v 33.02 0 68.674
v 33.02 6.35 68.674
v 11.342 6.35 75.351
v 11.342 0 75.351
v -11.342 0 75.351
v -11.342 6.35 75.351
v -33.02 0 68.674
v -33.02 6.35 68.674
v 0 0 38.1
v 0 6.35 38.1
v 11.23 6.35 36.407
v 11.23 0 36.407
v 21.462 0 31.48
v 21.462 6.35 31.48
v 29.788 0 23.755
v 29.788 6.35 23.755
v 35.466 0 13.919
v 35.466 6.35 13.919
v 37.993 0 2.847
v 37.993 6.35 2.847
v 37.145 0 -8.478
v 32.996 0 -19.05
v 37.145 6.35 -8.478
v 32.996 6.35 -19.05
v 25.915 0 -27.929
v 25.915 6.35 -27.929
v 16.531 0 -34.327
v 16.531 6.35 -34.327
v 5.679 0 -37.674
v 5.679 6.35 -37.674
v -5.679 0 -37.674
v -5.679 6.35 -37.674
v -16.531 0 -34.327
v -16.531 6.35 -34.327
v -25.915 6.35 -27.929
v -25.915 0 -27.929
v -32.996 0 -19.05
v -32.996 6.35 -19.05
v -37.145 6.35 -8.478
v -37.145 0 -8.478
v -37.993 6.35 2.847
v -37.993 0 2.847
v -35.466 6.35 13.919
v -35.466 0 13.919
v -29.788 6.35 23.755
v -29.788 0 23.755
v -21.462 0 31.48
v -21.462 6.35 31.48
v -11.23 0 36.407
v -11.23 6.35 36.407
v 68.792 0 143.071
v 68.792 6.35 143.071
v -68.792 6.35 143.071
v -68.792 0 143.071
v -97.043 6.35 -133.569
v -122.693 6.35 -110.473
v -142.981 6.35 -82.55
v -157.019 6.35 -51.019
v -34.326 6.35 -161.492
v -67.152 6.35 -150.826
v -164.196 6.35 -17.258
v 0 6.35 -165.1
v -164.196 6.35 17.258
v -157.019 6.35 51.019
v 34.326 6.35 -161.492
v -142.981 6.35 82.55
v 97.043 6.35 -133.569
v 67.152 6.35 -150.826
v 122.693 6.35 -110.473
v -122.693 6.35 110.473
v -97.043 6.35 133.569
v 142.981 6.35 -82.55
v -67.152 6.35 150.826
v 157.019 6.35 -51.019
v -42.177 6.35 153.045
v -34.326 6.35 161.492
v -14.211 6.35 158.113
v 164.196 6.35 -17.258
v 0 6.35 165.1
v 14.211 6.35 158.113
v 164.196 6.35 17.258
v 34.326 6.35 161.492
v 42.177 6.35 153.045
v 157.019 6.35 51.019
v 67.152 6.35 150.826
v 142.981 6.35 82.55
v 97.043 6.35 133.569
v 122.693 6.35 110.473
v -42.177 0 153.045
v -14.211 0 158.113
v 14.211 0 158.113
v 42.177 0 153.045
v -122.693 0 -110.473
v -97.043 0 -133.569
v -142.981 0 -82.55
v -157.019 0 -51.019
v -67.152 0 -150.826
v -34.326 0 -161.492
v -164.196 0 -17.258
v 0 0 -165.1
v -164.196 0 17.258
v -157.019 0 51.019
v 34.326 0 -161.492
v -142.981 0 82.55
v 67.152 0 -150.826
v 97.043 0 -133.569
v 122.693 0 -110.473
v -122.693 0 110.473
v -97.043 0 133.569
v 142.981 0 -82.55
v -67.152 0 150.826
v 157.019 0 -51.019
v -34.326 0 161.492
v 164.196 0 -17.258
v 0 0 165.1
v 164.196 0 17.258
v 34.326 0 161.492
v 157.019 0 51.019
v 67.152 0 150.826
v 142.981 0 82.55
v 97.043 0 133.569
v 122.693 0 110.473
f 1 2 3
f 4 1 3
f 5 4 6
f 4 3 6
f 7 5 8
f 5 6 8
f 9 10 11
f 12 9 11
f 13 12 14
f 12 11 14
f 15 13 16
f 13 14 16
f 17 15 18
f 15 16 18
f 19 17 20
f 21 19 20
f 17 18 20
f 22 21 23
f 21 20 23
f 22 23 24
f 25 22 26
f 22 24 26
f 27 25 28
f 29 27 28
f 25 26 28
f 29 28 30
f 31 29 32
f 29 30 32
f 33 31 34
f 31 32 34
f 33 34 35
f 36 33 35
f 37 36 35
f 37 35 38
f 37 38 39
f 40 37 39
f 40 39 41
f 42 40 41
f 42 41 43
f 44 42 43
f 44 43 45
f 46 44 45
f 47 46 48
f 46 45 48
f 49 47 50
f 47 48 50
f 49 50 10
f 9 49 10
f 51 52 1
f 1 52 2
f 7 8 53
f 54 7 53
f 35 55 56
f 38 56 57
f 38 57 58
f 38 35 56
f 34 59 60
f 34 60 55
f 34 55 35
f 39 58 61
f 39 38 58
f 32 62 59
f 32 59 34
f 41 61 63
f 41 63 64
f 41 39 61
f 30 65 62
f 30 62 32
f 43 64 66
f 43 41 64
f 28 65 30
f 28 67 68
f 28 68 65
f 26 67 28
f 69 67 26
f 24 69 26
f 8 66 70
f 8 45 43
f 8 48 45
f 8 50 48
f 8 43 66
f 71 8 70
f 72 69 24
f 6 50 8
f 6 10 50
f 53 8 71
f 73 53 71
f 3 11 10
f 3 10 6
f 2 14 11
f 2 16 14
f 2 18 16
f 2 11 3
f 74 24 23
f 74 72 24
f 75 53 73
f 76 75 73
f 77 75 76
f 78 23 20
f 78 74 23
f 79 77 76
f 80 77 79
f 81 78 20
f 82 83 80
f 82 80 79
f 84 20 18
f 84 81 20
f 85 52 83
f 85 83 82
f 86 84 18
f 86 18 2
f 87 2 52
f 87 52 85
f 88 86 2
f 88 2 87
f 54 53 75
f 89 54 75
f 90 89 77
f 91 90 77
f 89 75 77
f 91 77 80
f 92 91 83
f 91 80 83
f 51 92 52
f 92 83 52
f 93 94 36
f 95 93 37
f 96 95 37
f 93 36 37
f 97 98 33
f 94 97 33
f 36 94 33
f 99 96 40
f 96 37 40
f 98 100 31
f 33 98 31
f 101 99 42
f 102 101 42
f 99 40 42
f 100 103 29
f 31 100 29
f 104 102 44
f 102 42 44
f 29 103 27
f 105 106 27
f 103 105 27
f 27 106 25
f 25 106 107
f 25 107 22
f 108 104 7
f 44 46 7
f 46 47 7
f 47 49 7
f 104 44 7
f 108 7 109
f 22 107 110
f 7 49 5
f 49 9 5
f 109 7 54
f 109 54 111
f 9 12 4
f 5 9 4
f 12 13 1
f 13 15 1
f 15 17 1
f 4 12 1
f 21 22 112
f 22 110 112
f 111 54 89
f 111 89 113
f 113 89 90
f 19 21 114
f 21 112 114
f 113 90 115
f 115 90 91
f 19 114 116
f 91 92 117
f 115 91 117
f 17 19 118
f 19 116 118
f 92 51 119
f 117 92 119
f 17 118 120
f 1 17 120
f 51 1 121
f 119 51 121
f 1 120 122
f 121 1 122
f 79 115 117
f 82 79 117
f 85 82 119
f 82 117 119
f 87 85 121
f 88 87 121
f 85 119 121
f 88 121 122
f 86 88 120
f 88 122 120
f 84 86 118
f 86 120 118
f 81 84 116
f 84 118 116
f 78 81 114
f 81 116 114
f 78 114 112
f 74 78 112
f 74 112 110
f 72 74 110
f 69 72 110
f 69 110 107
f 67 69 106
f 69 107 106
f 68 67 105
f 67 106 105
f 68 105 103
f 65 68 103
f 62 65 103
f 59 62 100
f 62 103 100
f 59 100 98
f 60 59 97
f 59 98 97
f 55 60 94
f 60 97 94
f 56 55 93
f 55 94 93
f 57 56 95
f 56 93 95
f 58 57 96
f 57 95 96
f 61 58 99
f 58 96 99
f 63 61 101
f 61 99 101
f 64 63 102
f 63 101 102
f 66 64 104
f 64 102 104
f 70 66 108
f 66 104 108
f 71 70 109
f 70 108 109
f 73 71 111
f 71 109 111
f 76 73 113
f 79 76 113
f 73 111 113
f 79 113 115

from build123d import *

# Parameters (mm, degrees)
SKETCH1_R           = 165.1
BOSS_EXTRUDE1_DEPTH = 6.35
SKETCH2_R           = 38.1
CUT_EXTRUDE1_DEPTH  = 6.35
CUT_EXTRUDE2_DEPTH  = 6.35


with BuildPart() as part:
    # Sketch1 → Boss-Extrude1 (new body)
    with BuildSketch(Plane(origin=(0, 0, 0), x_dir=(1, 0, 0), z_dir=(0, 1, 0))):
        with Locations(Location((0, 0, 0), (0, 0, 270))):
            Circle(SKETCH1_R)
    extrude(amount=BOSS_EXTRUDE1_DEPTH)

    # Sketch2 → Cut-Extrude1 (cut)
    with BuildSketch(Plane(origin=(0, 6.35, 0), x_dir=(1, 0, 0), z_dir=(0, 1, 0))):
        with Locations(Location((0, 0, 0), (0, 0, 270))):
            Circle(SKETCH2_R)
    extrude(amount=-CUT_EXTRUDE1_DEPTH, mode=Mode.SUBTRACT)

    # Sketch3 → Cut-Extrude2 (cut)
    with BuildSketch(Plane(origin=(0, 6.35, 0), x_dir=(1, 0, 0), z_dir=(0, 1, 0))):
        with BuildLine():
            Line((-33.02, -68.67400964), (-68.791666667, -143.070853416))
            ThreePointArc((-68.791666667, -143.070853416), (0, -158.75), (68.791666667, -143.070853416))
            Line((68.791666667, -143.070853416), (33.02, -68.67400964))
            ThreePointArc((33.02, -68.67400964), (0, -76.2), (-33.02, -68.67400964))
        make_face()
    extrude(amount=-CUT_EXTRUDE2_DEPTH, mode=Mode.SUBTRACT)


solid = part.part
